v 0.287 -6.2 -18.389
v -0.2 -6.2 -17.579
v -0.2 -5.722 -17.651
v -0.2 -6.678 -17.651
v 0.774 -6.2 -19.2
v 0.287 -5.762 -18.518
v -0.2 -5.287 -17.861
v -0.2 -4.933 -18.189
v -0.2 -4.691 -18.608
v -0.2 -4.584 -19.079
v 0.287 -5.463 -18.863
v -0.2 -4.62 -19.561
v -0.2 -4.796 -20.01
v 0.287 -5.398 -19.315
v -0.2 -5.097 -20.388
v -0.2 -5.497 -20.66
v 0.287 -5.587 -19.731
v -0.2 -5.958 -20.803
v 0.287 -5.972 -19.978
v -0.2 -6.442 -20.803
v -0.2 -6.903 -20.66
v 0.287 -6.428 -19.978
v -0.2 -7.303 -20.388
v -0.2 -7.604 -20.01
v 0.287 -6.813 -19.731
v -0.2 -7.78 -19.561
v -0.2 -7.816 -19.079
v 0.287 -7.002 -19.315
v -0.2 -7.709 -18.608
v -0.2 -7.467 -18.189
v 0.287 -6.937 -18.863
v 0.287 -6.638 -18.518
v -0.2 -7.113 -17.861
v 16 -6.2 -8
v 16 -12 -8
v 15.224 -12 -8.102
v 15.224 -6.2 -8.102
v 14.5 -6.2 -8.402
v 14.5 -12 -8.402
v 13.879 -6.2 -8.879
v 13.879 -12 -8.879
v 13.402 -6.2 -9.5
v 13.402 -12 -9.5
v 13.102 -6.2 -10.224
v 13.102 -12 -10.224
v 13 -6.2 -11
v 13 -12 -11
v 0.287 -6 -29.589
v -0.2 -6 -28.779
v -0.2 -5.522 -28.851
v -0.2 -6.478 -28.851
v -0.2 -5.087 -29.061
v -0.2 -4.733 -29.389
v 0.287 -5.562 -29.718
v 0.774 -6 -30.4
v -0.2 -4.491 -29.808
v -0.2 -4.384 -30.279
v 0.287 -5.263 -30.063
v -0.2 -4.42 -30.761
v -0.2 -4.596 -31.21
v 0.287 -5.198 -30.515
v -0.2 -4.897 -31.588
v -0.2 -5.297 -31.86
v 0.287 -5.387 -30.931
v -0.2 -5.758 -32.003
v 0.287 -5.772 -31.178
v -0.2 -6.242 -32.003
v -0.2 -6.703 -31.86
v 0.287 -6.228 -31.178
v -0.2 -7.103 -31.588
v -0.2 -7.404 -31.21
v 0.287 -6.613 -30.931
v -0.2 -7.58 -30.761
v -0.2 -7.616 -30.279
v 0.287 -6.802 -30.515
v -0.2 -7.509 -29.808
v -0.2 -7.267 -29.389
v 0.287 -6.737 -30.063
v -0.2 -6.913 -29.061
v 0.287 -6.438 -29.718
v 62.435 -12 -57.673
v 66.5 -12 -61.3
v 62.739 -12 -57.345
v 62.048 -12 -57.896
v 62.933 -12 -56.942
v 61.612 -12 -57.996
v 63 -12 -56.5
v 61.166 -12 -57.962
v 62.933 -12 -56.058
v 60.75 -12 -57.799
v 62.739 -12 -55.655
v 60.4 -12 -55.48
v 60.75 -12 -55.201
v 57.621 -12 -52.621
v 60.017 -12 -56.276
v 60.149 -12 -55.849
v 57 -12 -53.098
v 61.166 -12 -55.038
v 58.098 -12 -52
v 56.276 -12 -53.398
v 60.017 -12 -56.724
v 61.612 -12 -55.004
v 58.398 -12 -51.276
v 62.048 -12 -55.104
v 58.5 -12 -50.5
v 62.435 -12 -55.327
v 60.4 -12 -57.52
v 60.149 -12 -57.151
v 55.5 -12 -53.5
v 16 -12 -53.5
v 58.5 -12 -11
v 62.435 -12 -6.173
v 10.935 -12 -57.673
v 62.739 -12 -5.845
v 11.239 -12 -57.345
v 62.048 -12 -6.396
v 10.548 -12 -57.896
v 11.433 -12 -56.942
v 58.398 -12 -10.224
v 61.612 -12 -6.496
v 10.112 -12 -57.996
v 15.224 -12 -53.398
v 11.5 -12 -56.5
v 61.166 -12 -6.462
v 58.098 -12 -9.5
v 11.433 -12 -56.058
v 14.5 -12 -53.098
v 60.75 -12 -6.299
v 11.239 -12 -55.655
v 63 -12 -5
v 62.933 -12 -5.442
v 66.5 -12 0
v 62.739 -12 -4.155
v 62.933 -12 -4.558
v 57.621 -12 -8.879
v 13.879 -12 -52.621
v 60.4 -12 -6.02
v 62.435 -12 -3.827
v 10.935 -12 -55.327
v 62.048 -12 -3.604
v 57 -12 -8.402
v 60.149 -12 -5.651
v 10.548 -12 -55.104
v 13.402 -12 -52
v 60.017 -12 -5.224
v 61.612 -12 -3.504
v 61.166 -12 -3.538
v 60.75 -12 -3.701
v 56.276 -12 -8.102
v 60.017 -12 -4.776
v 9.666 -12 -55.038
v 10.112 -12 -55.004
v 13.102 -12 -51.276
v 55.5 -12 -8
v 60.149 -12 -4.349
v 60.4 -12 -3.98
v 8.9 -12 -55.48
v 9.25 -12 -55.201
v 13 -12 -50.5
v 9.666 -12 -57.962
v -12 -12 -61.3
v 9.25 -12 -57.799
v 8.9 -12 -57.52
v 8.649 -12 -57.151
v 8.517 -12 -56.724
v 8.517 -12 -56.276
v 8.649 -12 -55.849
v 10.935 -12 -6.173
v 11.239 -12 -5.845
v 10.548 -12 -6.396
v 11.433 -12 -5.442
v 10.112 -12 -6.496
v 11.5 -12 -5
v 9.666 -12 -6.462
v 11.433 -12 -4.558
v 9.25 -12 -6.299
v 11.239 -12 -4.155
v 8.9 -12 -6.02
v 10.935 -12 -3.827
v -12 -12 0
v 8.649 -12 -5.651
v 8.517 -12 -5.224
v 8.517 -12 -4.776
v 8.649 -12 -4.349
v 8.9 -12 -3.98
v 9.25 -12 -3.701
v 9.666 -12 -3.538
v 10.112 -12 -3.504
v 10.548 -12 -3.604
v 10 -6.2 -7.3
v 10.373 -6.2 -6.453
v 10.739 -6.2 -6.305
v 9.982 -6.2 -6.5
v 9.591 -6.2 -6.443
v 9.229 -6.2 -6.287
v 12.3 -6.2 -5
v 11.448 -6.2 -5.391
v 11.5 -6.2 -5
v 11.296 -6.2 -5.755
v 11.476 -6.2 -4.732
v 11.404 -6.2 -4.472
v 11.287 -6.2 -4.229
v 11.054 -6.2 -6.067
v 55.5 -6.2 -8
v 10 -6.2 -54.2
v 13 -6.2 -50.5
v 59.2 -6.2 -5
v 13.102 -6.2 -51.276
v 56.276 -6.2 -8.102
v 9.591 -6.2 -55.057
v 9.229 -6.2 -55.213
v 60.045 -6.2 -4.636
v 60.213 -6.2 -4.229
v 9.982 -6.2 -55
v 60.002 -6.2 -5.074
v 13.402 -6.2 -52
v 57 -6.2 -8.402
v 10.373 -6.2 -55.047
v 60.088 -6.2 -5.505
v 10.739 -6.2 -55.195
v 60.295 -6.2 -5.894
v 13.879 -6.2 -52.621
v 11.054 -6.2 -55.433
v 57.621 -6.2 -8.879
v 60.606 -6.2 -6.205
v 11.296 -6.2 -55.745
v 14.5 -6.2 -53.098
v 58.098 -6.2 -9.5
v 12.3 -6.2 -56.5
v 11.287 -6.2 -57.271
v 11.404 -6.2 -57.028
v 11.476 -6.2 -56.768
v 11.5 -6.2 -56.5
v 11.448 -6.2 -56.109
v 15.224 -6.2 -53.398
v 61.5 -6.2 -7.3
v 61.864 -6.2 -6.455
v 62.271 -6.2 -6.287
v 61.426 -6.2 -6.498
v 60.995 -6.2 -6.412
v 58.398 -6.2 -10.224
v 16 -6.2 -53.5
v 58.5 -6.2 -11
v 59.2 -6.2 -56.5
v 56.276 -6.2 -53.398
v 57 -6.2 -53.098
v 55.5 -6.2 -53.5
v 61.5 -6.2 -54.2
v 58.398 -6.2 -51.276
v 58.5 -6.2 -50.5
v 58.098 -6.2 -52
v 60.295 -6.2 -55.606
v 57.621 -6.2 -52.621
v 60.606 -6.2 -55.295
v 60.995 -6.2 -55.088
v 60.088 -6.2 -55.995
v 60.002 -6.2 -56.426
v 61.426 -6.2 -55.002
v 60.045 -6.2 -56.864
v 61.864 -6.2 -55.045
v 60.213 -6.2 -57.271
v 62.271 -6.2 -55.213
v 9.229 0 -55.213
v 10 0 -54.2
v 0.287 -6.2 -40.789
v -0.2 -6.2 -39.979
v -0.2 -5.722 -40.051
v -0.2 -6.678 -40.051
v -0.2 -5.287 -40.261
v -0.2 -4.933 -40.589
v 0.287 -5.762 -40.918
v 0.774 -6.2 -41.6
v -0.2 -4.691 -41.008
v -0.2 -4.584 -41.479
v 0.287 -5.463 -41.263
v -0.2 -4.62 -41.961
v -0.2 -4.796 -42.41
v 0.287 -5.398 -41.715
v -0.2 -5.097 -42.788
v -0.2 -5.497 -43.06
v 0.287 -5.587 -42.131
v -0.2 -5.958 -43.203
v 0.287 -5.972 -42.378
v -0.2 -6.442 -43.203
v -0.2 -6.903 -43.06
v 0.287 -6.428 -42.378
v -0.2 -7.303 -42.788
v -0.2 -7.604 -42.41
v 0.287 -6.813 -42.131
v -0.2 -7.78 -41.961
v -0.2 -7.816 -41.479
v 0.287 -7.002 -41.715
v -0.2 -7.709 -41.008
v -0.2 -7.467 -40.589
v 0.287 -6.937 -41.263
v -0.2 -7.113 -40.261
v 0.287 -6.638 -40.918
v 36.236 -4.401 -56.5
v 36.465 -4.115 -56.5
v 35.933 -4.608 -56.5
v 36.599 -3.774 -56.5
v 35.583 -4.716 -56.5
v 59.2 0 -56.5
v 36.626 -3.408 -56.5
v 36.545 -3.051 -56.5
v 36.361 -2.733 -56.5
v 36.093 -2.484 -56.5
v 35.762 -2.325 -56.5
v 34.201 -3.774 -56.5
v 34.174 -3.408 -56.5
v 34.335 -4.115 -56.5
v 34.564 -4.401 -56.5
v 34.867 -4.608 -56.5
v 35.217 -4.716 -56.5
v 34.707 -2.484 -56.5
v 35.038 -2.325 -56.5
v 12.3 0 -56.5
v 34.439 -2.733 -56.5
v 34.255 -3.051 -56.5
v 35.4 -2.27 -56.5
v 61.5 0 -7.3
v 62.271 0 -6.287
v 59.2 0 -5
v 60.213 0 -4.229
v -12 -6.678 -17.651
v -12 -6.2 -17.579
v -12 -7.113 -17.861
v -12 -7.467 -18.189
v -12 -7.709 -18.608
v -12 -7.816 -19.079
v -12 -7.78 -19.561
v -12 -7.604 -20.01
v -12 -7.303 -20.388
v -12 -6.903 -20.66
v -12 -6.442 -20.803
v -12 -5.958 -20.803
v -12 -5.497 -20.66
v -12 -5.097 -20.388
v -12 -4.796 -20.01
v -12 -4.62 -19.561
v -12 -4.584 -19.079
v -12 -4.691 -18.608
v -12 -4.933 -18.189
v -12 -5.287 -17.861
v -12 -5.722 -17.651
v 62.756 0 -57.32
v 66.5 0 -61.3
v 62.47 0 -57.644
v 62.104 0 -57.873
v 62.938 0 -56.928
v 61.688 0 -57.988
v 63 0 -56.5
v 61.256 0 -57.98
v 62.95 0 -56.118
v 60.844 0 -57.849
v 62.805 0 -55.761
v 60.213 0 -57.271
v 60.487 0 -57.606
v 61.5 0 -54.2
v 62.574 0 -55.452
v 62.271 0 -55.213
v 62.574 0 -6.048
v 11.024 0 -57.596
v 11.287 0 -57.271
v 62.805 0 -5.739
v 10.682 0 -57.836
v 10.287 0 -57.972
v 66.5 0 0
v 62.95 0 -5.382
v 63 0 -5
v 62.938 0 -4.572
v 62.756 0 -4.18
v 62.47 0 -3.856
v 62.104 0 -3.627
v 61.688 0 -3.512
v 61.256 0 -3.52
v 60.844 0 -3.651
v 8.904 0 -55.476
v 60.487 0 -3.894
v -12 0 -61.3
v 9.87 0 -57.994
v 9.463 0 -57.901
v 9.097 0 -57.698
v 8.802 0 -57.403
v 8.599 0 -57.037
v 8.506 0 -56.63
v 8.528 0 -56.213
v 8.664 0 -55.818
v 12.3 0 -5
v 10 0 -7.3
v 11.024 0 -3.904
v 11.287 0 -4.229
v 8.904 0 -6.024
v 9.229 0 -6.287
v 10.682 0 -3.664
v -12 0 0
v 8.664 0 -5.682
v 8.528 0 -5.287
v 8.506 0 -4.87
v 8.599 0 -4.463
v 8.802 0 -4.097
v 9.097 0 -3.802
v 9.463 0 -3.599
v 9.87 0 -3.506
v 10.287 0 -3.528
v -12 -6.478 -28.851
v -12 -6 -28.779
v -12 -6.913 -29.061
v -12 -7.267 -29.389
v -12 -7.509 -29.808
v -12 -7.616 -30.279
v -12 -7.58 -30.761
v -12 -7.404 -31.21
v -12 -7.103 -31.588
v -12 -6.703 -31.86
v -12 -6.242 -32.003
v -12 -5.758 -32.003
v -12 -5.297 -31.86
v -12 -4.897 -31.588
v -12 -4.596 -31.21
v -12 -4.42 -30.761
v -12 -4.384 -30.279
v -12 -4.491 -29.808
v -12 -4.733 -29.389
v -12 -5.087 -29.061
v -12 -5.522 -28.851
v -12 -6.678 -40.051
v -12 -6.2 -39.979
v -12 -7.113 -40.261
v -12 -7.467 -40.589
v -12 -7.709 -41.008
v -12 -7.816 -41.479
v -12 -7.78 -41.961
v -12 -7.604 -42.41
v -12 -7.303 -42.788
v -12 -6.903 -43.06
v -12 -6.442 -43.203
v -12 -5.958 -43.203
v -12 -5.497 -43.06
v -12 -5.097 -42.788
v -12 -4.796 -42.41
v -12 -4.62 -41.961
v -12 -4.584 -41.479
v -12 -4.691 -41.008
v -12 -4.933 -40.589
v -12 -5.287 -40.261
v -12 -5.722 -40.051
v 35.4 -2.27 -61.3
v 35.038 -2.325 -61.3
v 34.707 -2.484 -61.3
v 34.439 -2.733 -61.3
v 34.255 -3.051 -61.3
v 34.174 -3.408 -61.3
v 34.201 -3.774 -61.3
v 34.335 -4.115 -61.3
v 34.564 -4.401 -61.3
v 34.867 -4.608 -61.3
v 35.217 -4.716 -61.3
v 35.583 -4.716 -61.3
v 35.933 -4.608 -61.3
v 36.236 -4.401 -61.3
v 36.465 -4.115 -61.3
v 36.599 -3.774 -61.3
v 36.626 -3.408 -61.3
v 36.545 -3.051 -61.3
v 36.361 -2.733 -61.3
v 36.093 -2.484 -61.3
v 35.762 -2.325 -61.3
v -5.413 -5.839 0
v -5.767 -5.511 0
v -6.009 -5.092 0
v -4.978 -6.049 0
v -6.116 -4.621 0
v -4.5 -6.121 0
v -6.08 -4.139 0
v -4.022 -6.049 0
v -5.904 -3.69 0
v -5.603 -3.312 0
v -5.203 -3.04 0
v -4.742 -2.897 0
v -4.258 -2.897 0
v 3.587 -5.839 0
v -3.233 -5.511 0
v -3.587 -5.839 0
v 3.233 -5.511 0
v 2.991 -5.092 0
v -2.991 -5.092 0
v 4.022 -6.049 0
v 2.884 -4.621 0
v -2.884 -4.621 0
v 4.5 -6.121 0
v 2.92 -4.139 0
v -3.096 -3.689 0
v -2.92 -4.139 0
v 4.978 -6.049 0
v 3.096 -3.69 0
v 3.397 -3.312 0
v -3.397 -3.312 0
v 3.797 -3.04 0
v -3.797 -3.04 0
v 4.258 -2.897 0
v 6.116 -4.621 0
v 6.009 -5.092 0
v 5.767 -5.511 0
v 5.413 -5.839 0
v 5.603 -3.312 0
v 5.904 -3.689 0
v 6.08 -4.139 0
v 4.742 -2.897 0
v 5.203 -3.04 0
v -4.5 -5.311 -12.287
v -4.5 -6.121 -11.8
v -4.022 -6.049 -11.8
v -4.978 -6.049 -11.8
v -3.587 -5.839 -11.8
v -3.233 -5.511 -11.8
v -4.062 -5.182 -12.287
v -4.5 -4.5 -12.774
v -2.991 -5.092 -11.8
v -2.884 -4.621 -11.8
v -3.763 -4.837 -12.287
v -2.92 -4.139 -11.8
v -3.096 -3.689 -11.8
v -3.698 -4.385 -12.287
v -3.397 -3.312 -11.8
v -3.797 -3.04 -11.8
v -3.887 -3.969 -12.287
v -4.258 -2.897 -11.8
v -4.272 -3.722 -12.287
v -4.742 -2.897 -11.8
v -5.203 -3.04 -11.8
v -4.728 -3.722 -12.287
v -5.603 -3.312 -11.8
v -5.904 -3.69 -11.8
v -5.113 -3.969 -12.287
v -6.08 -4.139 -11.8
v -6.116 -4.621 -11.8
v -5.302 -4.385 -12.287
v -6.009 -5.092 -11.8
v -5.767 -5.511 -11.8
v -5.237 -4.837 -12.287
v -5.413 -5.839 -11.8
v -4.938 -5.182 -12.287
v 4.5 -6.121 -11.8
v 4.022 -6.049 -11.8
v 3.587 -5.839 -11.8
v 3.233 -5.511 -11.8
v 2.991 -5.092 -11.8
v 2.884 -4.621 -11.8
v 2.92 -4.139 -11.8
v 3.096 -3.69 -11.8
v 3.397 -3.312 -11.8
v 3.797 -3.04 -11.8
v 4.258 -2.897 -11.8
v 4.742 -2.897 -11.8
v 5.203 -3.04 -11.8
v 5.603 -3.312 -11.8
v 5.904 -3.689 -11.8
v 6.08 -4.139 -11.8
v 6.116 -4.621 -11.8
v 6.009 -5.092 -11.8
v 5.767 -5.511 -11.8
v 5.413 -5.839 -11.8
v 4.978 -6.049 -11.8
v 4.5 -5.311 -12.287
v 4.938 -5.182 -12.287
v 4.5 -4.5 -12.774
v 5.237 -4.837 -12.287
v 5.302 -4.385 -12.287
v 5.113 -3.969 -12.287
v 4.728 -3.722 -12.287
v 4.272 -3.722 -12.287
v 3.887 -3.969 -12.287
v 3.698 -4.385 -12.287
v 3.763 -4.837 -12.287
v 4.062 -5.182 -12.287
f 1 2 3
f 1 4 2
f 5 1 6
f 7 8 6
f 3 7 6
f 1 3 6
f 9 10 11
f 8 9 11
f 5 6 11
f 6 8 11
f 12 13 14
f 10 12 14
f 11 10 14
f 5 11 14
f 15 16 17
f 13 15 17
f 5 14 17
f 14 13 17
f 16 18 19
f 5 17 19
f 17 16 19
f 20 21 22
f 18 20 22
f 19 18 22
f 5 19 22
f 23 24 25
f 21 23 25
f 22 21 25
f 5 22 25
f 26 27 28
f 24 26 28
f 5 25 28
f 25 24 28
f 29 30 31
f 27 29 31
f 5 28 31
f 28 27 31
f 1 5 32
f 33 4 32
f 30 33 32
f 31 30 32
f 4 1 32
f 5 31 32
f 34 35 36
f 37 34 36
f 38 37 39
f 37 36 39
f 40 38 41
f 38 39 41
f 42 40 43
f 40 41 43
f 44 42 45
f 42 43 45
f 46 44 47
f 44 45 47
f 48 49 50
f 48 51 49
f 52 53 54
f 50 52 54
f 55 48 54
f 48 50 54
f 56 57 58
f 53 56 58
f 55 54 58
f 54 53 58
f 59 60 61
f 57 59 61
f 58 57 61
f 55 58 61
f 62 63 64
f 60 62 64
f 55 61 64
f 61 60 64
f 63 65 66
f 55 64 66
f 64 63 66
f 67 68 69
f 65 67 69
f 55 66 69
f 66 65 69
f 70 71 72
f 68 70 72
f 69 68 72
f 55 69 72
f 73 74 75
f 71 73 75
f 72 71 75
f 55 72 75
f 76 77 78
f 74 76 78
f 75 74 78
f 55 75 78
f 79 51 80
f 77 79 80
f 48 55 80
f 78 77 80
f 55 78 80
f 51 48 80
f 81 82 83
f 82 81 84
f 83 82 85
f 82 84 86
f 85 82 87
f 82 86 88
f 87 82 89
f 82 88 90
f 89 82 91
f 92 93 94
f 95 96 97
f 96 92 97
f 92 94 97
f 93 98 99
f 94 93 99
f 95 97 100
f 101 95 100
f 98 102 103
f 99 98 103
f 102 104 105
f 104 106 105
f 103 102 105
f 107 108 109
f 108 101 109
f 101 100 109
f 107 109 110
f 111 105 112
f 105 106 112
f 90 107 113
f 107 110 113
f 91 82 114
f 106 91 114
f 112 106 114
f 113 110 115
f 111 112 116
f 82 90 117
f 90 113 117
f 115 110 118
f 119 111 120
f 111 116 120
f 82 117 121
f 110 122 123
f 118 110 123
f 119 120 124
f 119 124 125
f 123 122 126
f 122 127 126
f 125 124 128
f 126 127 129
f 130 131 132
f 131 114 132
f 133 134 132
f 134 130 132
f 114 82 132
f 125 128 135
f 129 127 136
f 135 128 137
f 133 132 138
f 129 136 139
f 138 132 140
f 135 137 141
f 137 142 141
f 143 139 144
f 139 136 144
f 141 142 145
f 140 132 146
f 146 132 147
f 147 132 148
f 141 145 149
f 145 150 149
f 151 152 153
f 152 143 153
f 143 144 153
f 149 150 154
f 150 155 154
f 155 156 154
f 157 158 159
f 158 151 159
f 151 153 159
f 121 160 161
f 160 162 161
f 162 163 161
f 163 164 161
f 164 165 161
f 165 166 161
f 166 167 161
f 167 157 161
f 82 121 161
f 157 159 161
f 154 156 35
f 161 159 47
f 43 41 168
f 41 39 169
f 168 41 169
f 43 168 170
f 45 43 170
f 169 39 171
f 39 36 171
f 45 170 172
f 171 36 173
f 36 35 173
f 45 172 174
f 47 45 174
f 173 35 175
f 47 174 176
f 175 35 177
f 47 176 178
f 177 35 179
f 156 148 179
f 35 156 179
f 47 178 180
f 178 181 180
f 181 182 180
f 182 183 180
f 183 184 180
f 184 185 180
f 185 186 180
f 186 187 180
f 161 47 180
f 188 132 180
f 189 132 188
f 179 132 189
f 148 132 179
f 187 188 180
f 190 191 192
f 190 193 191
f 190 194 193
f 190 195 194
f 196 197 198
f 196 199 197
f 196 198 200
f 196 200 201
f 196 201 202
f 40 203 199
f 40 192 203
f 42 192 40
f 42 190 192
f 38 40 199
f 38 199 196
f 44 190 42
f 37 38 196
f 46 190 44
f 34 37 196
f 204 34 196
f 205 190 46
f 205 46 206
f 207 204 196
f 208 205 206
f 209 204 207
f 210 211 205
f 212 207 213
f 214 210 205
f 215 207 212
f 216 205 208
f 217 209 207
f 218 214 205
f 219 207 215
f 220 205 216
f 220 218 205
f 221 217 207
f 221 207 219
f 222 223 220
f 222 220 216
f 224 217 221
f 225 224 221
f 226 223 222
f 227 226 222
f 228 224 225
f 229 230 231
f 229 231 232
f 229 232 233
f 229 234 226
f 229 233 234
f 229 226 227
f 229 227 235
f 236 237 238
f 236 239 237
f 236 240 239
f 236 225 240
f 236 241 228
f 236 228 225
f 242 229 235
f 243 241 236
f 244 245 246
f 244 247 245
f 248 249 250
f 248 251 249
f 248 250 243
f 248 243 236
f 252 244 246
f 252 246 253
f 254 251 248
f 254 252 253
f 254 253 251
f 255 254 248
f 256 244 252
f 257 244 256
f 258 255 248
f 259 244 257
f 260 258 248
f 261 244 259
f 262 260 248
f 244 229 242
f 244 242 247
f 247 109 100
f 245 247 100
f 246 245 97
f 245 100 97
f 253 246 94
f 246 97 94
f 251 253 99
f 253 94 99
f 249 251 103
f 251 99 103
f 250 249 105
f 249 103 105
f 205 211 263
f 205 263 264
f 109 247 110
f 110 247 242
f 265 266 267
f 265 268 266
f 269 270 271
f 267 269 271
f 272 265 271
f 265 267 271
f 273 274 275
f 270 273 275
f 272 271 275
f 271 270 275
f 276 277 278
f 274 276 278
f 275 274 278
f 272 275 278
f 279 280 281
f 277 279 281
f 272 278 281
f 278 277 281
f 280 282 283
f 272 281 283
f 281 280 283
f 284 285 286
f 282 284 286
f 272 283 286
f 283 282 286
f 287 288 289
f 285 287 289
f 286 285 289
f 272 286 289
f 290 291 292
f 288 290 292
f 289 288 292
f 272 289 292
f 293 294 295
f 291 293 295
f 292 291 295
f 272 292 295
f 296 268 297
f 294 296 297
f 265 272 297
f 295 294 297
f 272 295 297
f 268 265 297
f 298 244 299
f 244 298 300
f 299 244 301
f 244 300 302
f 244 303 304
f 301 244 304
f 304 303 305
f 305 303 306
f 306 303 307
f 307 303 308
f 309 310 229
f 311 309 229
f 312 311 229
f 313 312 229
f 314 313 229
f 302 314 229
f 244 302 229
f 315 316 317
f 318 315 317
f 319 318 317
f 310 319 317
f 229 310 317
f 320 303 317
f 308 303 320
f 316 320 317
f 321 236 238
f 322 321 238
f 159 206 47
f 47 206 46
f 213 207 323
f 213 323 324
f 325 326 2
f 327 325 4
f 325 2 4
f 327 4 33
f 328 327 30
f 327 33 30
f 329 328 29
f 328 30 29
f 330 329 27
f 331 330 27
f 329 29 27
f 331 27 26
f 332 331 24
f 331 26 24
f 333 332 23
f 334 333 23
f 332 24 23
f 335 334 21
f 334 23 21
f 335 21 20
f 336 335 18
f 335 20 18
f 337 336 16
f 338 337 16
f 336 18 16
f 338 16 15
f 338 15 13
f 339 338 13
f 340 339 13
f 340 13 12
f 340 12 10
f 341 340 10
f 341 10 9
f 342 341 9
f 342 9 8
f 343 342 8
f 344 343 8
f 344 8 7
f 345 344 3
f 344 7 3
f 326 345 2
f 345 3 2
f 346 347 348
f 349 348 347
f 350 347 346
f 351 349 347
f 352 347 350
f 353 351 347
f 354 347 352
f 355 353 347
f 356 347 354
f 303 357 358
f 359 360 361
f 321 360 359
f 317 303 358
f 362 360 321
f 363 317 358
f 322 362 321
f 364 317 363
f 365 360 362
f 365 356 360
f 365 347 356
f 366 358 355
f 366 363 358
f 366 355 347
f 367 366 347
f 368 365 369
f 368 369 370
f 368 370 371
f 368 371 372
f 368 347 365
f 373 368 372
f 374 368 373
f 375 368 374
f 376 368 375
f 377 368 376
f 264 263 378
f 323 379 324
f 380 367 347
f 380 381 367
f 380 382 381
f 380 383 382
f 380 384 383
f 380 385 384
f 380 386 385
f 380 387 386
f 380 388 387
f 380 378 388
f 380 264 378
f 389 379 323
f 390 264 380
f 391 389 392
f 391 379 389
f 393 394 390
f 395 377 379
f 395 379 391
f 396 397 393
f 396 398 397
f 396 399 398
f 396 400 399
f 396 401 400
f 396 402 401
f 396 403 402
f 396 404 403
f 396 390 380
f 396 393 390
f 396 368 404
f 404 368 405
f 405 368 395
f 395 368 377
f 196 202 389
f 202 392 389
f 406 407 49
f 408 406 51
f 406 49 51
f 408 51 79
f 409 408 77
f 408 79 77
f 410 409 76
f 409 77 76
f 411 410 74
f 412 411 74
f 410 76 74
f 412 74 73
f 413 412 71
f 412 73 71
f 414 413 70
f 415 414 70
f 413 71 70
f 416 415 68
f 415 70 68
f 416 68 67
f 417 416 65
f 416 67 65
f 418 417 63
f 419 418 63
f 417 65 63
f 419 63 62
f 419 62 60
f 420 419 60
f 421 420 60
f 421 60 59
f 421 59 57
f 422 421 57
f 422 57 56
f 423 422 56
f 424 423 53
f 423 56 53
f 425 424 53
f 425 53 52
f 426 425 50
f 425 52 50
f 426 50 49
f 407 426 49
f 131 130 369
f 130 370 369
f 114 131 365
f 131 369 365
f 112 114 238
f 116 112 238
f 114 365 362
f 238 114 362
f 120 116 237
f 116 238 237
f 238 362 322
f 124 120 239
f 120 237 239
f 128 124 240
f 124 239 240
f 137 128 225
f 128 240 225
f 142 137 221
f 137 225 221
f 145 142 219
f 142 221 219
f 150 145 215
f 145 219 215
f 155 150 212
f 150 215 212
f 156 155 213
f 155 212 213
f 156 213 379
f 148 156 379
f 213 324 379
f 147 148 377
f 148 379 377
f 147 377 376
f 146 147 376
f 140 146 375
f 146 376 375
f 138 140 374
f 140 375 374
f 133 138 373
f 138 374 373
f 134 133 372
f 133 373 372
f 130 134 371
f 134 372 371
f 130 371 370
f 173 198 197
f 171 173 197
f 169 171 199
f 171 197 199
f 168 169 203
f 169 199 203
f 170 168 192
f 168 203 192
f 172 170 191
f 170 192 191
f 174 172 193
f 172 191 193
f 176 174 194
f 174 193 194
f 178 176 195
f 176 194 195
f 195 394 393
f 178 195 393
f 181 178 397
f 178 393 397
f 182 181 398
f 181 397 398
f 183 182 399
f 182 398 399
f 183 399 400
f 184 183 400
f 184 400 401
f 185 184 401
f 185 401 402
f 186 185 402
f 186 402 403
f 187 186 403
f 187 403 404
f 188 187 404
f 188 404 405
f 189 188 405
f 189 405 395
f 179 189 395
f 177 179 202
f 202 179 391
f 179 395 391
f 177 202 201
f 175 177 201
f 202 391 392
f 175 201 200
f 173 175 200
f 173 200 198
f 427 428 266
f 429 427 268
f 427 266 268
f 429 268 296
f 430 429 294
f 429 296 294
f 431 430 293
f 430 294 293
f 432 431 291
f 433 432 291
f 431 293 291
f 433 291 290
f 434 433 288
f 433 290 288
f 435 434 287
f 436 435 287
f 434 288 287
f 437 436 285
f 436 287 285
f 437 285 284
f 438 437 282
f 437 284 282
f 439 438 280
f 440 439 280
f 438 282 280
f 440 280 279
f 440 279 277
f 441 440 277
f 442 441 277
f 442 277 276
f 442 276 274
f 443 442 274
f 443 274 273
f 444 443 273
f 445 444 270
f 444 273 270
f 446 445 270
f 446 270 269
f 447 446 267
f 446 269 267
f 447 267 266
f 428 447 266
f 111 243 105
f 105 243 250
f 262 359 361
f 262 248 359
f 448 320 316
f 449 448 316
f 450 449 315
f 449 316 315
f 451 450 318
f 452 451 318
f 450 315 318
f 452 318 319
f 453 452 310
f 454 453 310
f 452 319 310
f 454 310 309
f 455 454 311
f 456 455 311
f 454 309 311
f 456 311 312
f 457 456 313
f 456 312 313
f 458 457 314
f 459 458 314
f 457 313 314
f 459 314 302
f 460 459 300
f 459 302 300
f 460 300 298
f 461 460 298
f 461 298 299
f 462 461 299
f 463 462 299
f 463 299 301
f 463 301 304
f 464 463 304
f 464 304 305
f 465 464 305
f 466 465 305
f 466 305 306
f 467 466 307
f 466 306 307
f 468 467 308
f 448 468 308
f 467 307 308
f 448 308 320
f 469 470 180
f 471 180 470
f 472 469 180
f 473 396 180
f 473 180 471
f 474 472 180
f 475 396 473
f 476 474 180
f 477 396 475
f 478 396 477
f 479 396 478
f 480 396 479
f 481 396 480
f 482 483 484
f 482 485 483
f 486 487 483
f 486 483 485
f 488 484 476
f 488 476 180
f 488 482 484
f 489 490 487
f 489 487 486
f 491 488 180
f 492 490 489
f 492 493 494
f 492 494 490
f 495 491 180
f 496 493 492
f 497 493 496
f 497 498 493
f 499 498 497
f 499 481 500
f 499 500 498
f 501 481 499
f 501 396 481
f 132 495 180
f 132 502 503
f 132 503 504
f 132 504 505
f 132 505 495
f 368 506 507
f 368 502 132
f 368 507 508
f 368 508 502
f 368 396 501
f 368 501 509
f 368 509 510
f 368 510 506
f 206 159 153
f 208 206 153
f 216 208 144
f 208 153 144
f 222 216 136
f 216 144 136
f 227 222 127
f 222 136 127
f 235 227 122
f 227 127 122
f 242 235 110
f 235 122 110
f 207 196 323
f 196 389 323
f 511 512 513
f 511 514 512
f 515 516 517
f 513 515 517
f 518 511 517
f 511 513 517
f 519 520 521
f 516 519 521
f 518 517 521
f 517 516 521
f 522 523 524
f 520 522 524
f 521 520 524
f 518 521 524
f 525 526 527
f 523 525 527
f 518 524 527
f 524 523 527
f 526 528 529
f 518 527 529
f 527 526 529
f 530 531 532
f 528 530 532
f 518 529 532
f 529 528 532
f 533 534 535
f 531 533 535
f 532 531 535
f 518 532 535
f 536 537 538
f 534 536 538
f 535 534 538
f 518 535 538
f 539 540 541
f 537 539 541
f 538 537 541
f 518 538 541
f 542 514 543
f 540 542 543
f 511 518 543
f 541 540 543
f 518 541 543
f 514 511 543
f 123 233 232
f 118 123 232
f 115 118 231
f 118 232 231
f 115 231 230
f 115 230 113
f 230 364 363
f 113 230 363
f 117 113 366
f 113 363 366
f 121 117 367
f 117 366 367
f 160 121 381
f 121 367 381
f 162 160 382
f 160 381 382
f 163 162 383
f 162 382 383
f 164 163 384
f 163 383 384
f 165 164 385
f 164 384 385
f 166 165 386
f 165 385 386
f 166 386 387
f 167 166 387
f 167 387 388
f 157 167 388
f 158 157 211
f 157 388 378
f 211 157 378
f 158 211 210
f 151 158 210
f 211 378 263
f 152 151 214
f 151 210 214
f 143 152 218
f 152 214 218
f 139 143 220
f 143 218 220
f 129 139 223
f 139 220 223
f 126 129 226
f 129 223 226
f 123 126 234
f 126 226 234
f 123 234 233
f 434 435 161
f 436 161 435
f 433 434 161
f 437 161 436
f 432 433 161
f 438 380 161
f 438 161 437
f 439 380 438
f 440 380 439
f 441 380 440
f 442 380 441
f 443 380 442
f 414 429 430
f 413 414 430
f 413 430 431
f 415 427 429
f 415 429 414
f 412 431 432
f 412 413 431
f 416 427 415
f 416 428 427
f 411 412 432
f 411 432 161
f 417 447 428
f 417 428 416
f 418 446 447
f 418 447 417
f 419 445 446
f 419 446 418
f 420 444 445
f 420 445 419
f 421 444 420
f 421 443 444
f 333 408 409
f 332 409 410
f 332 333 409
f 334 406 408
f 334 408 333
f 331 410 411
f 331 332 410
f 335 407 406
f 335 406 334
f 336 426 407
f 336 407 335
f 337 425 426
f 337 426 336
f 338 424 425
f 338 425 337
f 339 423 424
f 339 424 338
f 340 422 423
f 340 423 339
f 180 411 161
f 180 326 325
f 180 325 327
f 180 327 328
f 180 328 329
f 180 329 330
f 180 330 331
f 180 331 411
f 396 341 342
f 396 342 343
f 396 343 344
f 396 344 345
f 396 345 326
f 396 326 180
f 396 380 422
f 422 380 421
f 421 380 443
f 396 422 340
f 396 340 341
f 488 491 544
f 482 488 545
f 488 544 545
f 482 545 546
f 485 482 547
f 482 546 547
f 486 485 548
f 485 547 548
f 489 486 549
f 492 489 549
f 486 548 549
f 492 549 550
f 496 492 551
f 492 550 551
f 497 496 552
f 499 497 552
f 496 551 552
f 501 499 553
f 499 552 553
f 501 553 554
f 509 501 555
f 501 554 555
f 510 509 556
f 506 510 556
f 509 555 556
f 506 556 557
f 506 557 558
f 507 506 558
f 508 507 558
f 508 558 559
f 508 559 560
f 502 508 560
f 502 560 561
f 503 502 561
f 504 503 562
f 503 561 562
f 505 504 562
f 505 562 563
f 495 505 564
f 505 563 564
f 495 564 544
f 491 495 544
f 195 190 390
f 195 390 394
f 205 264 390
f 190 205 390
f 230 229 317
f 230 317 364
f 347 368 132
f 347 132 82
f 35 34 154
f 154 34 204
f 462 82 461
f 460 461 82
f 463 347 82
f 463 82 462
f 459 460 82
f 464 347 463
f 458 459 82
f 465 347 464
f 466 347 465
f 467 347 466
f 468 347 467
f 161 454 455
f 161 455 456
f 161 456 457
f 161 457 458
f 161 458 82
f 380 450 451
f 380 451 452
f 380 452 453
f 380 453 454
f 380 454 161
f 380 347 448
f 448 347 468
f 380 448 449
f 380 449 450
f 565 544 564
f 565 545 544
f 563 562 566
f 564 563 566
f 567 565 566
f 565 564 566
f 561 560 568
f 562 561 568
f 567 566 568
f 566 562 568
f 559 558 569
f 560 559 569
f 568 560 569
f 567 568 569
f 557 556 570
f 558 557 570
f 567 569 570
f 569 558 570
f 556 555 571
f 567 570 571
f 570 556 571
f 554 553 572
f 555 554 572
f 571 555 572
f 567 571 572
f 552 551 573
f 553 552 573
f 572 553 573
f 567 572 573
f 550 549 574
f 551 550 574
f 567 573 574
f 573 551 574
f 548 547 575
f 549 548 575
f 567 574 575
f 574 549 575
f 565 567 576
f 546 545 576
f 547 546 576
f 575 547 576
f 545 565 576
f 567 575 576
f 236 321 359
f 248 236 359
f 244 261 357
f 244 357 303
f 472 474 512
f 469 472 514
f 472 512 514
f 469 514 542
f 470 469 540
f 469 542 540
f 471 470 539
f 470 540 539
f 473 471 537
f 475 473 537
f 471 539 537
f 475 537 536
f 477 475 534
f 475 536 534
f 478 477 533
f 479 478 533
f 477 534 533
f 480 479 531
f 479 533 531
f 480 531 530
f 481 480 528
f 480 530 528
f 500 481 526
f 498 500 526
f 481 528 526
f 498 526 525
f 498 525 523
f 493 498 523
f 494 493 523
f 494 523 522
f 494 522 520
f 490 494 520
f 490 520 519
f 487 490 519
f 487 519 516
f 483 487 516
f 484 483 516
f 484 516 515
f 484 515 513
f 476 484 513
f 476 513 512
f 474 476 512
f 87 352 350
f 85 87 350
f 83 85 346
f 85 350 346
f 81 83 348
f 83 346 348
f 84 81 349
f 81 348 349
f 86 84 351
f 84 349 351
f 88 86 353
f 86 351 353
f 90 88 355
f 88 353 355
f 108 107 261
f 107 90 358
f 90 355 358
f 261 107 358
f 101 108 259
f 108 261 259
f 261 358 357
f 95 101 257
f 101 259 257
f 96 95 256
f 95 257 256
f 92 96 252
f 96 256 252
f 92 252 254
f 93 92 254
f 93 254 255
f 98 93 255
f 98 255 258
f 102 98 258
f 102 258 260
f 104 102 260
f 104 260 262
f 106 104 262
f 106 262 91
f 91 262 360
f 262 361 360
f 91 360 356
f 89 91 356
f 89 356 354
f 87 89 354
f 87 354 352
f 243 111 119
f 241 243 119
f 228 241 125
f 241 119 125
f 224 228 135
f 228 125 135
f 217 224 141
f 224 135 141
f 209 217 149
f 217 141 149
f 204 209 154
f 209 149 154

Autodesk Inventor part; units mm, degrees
ref_plane "YZ Plane" through (0, 0, 0) normal (1, 0, 0) x (0, 1, 0)
ref_plane "XZ Plane" through (0, 0, 0) normal (0, 1, 0) x (-1, 0, 0)
ref_plane "XY Plane" through (0, 0, 0) normal (0, 0, 1) x (1, 0, 0)
sketch "Sketch1" plane through (0, 0, 0) normal (0, 1, 0) x (-1, 0, 0)
  line L0 (12, 0) -> (-66.5, 0)
  line L1 (-66.5, 0) -> (-66.5, -61.3)
  line L2 (-66.5, -61.3) -> (12, -61.3)
  line L3 (12, -61.3) -> (12, 0)
  point P0 (0, 0)
  dimension "d0" = 12
  dimension "d1" = 66.5
  dimension "d2" = 61.3
extrude "Extrusion1" add sketch "Sketch1" against normal blind 12
sketch "Sketch2" plane through (0, 0, 0) normal (0, 1, 0) x (1, 0, 0)
  line L0 (61.5, 56.5) -> (10, 56.5)
  line L1 (10, 56.5) -> (10, 5)
  line L2 (10, 5) -> (61.5, 5)
  line L3 (61.5, 5) -> (61.5, 56.5)
  line L4 (-12, 0) -> (66.5, 0) projected
  point P0 (0, 0)
  dimension "d5" = 10
  dimension "d6" = 51.5
  dimension "d7" = 5
  dimension "d8" = 51.5
extrude "Extrusion2" cut sketch "Sketch2" against normal blind 6.2
sketch "Sketch3" plane through (0, 0, 0) normal (0, 1, 0) x (1, 0, 0)
  line L0 (61.5, 5) -> (10, 5) projected
  circle A0 centre (10, 5) radius 1.5
  circle A1 centre (61.5, 5) radius 1.5
  line L1 (10, 56.5) -> (61.5, 56.5) projected
  circle A2 centre (61.5, 56.5) radius 1.5
  circle A3 centre (10, 56.5) radius 1.5
  point P0 (0, 0)
  dimension "d11" = 3
extrude "Extrusion3" cut sketch "Sketch3" against normal through all
chamfer "Chamfer1" distance 0.8 angle 45 8 edges at (10, -3.1, -6.5) (10, -3.1, -55) (11.5, -3.1, -56.5) (60, -3.1, -56.5) (61.5, -3.1, -55) (61.5, -3.1, -6.5) (60, -3.1, -5) (11.5, -3.1, -5)
sketch "Sketch4" plane through (0, -6.2, 0) normal (0, 1, 0) x (1, 0, 0)
  arc A0 (9.229, 55.2133) -> (11.2867, 57.271) centre (10, 56.5) ccw construction
  line L0 (10, 56.5) -> (61.5, 56.5) construction
  line L1 (61.5, 56.5) -> (61.5, 5) construction
  line L2 (61.5, 5) -> (10, 5) construction
  line L3 (10, 5) -> (10, 56.5) construction
  arc A1 (60.2133, 4.229) -> (62.271, 6.2867) centre (61.5, 5) ccw construction
  line L4 (58.5, 8) -> (58.5, 53.5) construction
  line L5 (58.5, 53.5) -> (13, 53.5) construction
  line L6 (13, 53.5) -> (13, 8) construction
  line L7 (13, 8) -> (58.5, 8) construction
  line L8 (13, 8) -> (58.5, 8)
  line L9 (58.5, 8) -> (58.5, 53.5)
  line L10 (58.5, 53.5) -> (13, 53.5)
  line L11 (13, 53.5) -> (13, 8)
  point P0 (0, 0)
  dimension "d19" = 3
extrude "Extrusion4" cut sketch "Sketch4" against normal blind 6.2
fillet "Fillet1" radius 3 4 edges at (13, -9.1, -53.5) (58.5, -9.1, -8) (13, -9.1, -8) (58.5, -9.1, -53.5)
sketch "Sketch5" plane through (66.5, 0, -61.3) normal (0, 0, -1) x (-1, 0, 0)
  line L0 (0, 0) -> (78.5, 0) projected
  point P0 (66.5, 0)
  point P1 (31.1, -3.5)
  point P2 (56.5, -6.2)
  dimension "d24" = 25.4
  dimension "d25" = 3.5
hole "Hole1" at (35.4, -3.5, -61.3) direction (0, 0, 1) diameter 2.459 depth 8.8 tip angle 118 thread size "M3x0.5" class "6H" standard "ANSI Metric M Profile"
chamfer "Chamfer2" [suppressed]
sketch "Sketch6" plane through (-12, 0, -61.3) normal (-1, 0, 0) x (0, 0, 1)
  line L0 (56.3, 0) -> (56.3, -6.2) projected
  line L1 (56.3, -6.2) -> (56.3, 0) projected
  line L2 (4.8, -2.2705) -> (4.8, -4.7295) projected
  line L3 (4.8, 0) -> (4.8, -6.2) projected
  line L4 (4.8, -6.2) -> (4.8, 0) projected
  line L5 (30.9, -24.2917) -> (30.9, 19.2353) construction
  line L6 (49.4, 0) -> (12.4, 0) construction
  line L7 (12.4, 0) -> (12.4, -12) construction
  line L8 (12.4, -12) -> (49.4, -12) construction
  line L9 (49.4, -12) -> (49.4, 0) construction
  line L10 (49.4, 0) -> (12.4, -12) construction
  line L11 (12.4, 0) -> (49.4, -12) construction
  line L12 (0, 0) -> (61.3, 0) projected
  line L13 (61.3, -12) -> (0, -12) projected
  line L14 (7.1, -6.2) -> (54, -6.2) projected
  point P0 (30.9, -6)
  point P1 (19.7, -6.2)
  point P2 (42.1, -6.2)
  dimension "d36" = 25.4
  dimension "d37" = 37
  dimension "d38" = 22.4
hole "Hole2" at (-12, -6.2, -41.6) at (-12, -6.2, -19.2) at (-12, -6, -30.4) direction (1, 0, 0) diameter 3.242 depth 11.8 tip angle 118 thread size "M4x0.7" class "6H" standard "ANSI Metric M Profile"
sketch "Sketch7" plane through (-12, 0, 0) normal (0, 0, 1) x (1, 0, 0)
  line L0 (0, 0) -> (78.5, 0) projected
  line L1 (16.5, -4.5) -> (7.5, -4.5) construction
  point P0 (12, 0)
  dimension "d52" = 9
  dimension "d53" = 4.5
  dimension "d54" = 4.5
hole "Hole3" at (-4.5, -4.5, 0) at (4.5, -4.5, 0) direction (0, 0, -1) diameter 3.242 depth 11.8 tip angle 118 thread size "M4x0.7" class "6H" standard "ANSI Metric M Profile"
equation "\"d54\" = 0.5 * d52"
properties part number "MirrorHolder" material "Aluminum 6061"
